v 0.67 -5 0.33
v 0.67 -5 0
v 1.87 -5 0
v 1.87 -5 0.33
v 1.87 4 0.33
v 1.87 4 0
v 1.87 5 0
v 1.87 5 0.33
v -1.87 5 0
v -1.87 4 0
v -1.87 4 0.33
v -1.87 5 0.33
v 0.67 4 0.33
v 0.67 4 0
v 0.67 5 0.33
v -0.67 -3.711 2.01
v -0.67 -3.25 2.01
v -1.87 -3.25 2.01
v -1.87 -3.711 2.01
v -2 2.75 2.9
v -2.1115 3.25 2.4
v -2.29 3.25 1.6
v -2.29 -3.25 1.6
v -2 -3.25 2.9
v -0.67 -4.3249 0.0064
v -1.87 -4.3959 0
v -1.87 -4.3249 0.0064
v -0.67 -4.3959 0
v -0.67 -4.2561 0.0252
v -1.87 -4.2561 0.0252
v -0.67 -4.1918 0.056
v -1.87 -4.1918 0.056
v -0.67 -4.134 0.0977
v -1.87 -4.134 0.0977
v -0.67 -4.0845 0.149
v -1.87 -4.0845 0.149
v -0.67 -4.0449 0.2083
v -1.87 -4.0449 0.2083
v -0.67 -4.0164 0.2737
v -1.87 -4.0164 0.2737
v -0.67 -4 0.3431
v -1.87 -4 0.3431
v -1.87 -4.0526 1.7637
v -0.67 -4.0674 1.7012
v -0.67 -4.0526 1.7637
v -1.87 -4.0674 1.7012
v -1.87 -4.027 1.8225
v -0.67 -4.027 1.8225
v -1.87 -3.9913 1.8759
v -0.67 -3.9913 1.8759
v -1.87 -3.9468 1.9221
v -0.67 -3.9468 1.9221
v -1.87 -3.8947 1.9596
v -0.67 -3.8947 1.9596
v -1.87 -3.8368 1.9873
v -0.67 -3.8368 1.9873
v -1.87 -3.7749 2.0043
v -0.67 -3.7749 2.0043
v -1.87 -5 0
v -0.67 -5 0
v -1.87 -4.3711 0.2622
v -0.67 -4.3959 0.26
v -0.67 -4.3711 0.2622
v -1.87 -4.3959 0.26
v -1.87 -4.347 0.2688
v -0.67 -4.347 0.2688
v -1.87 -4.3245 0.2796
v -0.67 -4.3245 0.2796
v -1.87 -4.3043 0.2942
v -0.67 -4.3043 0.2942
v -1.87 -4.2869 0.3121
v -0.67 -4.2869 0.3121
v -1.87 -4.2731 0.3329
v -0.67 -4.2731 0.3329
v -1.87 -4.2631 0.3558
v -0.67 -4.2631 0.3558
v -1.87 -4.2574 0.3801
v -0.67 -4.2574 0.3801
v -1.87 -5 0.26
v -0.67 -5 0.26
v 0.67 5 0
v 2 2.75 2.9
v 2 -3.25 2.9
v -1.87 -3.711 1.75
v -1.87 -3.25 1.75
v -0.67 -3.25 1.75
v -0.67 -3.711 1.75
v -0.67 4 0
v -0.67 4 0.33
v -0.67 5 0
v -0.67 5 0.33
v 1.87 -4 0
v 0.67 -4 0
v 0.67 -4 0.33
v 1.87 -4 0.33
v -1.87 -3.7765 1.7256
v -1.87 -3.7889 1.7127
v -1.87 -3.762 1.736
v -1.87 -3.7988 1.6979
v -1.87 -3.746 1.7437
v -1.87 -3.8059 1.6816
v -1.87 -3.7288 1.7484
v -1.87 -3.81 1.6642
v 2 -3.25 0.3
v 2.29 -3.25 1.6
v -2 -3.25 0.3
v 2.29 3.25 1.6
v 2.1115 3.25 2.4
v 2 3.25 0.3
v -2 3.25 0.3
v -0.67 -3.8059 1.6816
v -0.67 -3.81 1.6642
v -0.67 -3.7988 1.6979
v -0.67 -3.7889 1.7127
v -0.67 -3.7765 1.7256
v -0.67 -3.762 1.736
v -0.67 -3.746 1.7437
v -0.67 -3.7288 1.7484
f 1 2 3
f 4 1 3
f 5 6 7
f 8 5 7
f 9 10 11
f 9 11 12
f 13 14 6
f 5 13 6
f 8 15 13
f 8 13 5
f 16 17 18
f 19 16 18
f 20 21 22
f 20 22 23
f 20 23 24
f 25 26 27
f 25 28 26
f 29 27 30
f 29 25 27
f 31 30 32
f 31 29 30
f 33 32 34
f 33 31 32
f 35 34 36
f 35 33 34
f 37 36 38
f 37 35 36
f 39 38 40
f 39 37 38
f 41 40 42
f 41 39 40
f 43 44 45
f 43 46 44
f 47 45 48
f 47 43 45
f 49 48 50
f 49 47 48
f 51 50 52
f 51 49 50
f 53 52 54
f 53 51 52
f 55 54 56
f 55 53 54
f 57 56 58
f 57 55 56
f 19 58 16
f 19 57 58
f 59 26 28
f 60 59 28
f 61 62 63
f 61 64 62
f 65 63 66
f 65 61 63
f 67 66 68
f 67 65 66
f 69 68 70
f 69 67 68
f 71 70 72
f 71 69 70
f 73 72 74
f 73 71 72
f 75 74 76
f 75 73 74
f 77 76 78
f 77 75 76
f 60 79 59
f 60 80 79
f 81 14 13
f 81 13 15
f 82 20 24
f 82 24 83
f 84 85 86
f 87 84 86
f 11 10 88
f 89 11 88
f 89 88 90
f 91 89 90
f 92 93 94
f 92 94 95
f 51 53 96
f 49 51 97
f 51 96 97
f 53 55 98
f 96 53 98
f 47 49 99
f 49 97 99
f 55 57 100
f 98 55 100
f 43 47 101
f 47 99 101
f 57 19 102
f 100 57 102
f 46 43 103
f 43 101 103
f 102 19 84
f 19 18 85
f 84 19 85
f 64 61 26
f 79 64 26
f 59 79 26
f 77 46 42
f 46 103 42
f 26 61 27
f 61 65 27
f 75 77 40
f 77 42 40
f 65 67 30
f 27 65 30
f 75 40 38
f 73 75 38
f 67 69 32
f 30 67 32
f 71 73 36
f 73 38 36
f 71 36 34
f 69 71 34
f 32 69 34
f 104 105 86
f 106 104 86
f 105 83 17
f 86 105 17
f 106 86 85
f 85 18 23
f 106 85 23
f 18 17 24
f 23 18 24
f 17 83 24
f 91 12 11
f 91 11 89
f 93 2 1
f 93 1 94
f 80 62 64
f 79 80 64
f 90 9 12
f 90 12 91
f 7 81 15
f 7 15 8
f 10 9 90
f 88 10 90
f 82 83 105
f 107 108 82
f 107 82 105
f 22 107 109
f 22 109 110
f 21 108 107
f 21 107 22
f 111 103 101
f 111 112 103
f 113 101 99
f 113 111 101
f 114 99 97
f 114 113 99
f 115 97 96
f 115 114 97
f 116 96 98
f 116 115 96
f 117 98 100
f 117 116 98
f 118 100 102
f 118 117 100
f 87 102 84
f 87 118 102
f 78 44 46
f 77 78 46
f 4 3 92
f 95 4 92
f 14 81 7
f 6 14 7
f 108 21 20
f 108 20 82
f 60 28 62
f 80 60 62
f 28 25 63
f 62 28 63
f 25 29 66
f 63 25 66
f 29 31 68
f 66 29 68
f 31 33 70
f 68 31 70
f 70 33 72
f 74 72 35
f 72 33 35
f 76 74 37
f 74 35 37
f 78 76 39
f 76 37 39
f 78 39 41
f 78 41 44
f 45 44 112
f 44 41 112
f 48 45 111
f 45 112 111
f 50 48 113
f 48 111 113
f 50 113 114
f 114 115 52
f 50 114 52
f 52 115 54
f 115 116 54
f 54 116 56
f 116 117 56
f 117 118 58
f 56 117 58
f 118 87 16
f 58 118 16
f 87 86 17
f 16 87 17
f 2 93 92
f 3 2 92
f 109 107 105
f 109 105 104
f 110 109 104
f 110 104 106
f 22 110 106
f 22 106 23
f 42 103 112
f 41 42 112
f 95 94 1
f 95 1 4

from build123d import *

# Parameters (mm, degrees)
SKETCH003_W  = 1.2
SKETCH003_H  = 1
PAD001_DEPTH = 0.33
SKETCH002_W  = 1.2
SKETCH002_H  = 0.26
PAD_DEPTH    = 3.25
CHAMFER_SIZE = 0.5


with BuildPart() as pins_pad:
    # Sketch003 → Pad001 (new body)
    with BuildSketch(Plane.XY):
        with Locations((1.27, -4.5)):
            Rectangle(SKETCH003_W, SKETCH003_H)
        with Locations((1.27, 4.5)):
            Rectangle(SKETCH003_W, SKETCH003_H)
        with Locations((-1.27, 4.5)):
            Rectangle(SKETCH003_W, SKETCH003_H)
    extrude(amount=PAD001_DEPTH)


with BuildPart() as pin1_sweep:
    # Sweep: sweep along a path in Sketch001
    with BuildLine(Plane.YZ) as sweep_path:
        Line((-5, 0), (-4.39593, 0))
        ThreePointArc((-4.39593, 0), (-4.133989, 0.097694), (-4, 0.343059))
        Line((-4, 0.343059), (-3.81, 1.664238))
        ThreePointArc((-3.81, 1.664238), (-3.776502, 1.725577), (-3.711019, 1.75))
        Line((-3.711019, 1.75), (-2.711019, 1.75))
    # Sketch002 → Sweep (sweep)
    with BuildSketch(Plane.XZ.offset(5)):
        with Locations((-1.27, 0.13)):
            Rectangle(SKETCH002_W, SKETCH002_H)
    sweep(path=sweep_path.line)


with BuildPart() as fusion:
    # Sketch → Pad (new body, symmetric)
    with BuildSketch(Plane(origin=(0, 0, 0), x_dir=(-1, 0, 0), z_dir=(0, 1, 0))):
        Polygon((-2, 2.9), (-2.29, 1.6), (-2, 0.3), (2, 0.3), (2.29, 1.6), (2, 2.9), align=None)
    extrude(amount=PAD_DEPTH, both=True)

    # Chamfer
    chamfer_edges = [fusion.edges().sort_by_distance(p)[0] for p in [
        (0, 3.25, 2.9),
    ]]
    chamfer(chamfer_edges, length=CHAMFER_SIZE)

    # Fusion: union Pins_Pad, Pin1_Sweep
    add(pins_pad.part)
    add(pin1_sweep.part)


solid = fusion.part
